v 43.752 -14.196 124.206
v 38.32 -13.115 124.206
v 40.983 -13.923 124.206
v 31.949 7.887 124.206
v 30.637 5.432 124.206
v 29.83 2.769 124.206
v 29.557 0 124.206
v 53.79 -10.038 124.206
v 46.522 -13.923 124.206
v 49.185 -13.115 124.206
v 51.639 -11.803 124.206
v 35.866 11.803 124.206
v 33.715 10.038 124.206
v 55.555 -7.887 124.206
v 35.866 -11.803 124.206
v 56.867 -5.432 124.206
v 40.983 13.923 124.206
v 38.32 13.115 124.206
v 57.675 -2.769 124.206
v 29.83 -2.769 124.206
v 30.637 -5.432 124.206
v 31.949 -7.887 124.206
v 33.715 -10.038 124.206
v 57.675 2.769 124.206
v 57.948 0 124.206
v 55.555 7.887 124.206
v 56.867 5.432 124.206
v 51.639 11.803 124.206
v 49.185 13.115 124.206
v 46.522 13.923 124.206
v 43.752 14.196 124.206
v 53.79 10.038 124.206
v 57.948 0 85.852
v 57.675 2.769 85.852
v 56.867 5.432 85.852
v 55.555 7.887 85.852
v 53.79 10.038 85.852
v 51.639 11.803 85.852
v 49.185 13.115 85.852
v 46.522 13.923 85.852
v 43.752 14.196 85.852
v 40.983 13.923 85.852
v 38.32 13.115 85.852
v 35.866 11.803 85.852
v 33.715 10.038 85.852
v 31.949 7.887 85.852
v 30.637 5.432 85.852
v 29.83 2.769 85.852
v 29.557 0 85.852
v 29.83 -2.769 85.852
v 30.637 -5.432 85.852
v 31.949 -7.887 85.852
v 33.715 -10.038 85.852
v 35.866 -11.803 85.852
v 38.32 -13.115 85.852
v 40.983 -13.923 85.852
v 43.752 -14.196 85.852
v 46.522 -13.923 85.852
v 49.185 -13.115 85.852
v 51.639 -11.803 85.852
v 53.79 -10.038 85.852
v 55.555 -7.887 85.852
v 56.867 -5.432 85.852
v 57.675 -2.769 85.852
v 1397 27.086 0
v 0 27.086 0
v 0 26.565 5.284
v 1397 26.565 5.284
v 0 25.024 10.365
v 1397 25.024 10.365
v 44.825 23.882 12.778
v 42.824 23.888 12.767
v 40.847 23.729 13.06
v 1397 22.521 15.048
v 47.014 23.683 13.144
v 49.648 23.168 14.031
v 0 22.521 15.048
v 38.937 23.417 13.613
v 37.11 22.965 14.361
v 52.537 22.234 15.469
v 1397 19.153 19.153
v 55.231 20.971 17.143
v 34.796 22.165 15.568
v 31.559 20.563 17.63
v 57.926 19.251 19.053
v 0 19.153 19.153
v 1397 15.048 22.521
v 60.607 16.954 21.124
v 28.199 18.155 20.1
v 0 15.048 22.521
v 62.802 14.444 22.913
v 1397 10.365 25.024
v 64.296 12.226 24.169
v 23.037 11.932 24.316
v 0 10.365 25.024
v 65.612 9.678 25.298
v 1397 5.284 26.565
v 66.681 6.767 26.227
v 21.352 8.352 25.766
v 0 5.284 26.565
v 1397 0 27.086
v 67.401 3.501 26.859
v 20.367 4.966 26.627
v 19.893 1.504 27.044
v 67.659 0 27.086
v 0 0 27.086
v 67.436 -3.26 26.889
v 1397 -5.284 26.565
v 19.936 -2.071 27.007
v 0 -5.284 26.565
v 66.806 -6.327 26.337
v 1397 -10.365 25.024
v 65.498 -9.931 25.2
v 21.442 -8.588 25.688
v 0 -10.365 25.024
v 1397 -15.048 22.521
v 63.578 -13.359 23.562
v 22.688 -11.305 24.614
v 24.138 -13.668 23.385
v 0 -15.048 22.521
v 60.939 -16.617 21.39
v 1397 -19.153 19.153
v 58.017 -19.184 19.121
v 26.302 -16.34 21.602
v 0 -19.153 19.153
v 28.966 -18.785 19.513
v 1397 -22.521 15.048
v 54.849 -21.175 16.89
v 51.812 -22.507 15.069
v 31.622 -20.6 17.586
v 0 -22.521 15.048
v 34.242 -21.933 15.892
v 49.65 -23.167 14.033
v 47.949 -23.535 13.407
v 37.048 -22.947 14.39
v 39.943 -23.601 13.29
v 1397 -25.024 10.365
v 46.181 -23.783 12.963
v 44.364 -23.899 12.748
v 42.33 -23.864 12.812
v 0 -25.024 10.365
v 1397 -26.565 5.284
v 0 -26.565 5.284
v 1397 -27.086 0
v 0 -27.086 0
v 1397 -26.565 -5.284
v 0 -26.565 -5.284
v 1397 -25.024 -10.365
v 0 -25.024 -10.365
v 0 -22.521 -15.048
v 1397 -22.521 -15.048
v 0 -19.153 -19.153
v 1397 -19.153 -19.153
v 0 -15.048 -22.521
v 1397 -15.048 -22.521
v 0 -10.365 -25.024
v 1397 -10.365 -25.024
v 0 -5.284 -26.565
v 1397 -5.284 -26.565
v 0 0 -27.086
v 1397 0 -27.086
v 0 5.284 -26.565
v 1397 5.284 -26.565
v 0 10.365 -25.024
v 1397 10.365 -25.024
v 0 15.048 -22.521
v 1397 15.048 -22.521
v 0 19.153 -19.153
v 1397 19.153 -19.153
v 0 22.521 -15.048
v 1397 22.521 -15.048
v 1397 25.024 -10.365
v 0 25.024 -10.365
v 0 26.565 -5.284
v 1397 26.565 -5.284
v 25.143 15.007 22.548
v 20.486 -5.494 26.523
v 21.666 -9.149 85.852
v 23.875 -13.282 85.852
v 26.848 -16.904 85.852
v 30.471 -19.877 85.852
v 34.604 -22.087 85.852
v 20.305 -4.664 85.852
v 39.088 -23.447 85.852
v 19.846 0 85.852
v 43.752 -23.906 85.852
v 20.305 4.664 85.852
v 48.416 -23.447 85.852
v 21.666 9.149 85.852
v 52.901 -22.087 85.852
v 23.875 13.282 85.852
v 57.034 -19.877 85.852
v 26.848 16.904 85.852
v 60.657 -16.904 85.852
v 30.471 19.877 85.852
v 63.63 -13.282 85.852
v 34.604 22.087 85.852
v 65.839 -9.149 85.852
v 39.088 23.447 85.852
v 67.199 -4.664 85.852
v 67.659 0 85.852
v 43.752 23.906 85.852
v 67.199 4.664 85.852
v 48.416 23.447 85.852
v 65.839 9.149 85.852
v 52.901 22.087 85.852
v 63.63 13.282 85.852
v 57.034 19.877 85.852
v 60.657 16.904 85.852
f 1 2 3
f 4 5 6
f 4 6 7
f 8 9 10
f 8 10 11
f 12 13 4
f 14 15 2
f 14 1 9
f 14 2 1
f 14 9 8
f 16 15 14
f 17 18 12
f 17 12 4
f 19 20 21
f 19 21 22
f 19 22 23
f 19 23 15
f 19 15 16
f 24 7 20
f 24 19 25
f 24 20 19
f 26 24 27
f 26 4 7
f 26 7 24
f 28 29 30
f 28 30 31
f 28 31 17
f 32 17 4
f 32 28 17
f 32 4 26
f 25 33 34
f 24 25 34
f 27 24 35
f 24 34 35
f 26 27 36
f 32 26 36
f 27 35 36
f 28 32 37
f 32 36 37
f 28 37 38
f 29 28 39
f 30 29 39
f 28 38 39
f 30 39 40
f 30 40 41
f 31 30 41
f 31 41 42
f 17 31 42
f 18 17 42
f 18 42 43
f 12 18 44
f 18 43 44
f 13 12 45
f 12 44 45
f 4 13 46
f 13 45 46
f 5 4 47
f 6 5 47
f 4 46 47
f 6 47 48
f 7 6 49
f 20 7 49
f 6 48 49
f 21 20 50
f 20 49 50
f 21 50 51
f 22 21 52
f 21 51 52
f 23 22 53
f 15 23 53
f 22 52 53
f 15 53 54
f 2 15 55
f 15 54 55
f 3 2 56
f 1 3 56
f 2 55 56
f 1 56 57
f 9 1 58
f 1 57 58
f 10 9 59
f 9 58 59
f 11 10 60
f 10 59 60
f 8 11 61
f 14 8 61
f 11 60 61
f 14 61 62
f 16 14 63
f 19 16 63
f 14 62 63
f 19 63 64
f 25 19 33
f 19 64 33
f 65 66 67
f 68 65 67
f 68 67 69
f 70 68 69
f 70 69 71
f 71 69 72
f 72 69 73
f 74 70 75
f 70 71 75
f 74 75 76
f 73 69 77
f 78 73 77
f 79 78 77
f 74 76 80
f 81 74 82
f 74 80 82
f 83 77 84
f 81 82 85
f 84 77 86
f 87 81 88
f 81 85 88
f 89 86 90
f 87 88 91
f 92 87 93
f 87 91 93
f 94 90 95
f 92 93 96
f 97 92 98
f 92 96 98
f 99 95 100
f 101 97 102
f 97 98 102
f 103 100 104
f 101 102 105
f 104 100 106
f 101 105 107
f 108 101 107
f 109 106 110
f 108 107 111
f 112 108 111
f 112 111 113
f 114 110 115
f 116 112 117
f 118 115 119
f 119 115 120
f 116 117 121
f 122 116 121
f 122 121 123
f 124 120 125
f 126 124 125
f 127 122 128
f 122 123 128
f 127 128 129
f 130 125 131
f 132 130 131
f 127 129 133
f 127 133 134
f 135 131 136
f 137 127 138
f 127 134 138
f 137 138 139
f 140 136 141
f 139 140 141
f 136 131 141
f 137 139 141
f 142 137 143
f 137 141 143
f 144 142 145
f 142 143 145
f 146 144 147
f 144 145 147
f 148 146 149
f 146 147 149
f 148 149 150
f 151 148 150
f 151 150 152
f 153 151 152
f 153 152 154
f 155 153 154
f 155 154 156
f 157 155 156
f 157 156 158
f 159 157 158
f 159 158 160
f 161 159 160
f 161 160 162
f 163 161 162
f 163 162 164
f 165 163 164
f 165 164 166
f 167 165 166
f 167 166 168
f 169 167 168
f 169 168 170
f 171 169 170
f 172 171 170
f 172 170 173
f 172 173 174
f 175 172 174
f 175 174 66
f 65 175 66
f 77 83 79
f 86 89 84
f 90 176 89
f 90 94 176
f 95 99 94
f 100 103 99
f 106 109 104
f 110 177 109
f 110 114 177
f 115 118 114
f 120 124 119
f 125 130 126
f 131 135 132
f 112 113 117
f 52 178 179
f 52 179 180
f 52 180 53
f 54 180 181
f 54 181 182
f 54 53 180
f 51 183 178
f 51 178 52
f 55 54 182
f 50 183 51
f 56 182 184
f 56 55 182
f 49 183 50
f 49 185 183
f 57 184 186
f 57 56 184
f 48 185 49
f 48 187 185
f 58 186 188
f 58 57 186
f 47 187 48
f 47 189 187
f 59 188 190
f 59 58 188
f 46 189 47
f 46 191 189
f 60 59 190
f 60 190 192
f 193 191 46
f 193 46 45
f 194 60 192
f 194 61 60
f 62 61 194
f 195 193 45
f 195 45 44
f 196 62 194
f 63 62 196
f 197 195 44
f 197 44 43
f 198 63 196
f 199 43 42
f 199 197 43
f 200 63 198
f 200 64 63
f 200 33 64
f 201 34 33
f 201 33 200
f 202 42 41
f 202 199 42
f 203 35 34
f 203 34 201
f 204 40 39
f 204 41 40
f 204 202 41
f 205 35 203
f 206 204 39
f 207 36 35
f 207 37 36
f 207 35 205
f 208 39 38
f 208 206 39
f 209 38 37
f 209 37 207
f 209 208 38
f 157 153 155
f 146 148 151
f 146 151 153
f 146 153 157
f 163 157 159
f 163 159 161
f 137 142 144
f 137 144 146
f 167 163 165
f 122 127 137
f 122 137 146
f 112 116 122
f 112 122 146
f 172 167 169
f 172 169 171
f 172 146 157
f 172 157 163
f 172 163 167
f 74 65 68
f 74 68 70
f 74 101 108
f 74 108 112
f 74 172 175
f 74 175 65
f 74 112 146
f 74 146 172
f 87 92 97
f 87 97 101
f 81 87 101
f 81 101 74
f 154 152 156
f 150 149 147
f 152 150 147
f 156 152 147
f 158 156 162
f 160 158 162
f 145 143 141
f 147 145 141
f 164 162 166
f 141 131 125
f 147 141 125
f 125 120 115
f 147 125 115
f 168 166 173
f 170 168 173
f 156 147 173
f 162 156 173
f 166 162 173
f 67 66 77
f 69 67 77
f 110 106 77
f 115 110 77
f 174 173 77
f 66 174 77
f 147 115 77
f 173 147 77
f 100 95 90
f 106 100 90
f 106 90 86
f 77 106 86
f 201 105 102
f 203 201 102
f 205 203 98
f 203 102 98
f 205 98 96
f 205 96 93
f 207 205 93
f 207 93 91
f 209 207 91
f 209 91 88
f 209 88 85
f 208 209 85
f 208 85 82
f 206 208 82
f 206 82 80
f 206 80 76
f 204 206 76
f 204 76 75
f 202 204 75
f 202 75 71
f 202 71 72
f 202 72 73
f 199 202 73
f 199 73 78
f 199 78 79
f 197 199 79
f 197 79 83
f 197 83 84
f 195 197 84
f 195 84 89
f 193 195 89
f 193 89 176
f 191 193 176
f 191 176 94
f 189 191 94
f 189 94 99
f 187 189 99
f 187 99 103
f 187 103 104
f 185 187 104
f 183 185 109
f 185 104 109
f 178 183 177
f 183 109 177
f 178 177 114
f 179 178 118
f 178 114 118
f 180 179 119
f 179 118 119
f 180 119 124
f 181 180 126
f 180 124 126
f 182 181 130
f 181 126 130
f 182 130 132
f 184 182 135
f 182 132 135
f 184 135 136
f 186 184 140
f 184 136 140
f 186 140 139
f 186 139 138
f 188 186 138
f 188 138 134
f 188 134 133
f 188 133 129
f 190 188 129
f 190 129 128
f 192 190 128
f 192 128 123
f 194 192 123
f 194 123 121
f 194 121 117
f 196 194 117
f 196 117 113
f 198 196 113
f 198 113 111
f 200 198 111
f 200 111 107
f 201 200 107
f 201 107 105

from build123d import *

# Parameters (mm, degrees)
F0_R     = 27.085871
F1_DEPTH = 1397
F2_R     = 23.906419
F3_DEPTH = 85.852
F4_R     = 14.195516
F5_DEPTH = 38.354


with BuildPart() as f1:
    # F0 (on Right) → F1 (new body)
    with BuildSketch(Plane.YZ):
        Circle(F0_R)
    extrude(amount=F1_DEPTH)

    # F2 (on Top) → F3 (join)
    with BuildSketch(Plane.XY):
        with Locations((43.752357, 0)):
            Circle(F2_R)
    extrude(amount=F3_DEPTH)

    # F4 (on face) → F5 (join)
    with BuildSketch(Plane.XY.offset(85.852)):
        with Locations((43.752357, 0)):
            Circle(F4_R)
    extrude(amount=F5_DEPTH)


solid = f1.part
